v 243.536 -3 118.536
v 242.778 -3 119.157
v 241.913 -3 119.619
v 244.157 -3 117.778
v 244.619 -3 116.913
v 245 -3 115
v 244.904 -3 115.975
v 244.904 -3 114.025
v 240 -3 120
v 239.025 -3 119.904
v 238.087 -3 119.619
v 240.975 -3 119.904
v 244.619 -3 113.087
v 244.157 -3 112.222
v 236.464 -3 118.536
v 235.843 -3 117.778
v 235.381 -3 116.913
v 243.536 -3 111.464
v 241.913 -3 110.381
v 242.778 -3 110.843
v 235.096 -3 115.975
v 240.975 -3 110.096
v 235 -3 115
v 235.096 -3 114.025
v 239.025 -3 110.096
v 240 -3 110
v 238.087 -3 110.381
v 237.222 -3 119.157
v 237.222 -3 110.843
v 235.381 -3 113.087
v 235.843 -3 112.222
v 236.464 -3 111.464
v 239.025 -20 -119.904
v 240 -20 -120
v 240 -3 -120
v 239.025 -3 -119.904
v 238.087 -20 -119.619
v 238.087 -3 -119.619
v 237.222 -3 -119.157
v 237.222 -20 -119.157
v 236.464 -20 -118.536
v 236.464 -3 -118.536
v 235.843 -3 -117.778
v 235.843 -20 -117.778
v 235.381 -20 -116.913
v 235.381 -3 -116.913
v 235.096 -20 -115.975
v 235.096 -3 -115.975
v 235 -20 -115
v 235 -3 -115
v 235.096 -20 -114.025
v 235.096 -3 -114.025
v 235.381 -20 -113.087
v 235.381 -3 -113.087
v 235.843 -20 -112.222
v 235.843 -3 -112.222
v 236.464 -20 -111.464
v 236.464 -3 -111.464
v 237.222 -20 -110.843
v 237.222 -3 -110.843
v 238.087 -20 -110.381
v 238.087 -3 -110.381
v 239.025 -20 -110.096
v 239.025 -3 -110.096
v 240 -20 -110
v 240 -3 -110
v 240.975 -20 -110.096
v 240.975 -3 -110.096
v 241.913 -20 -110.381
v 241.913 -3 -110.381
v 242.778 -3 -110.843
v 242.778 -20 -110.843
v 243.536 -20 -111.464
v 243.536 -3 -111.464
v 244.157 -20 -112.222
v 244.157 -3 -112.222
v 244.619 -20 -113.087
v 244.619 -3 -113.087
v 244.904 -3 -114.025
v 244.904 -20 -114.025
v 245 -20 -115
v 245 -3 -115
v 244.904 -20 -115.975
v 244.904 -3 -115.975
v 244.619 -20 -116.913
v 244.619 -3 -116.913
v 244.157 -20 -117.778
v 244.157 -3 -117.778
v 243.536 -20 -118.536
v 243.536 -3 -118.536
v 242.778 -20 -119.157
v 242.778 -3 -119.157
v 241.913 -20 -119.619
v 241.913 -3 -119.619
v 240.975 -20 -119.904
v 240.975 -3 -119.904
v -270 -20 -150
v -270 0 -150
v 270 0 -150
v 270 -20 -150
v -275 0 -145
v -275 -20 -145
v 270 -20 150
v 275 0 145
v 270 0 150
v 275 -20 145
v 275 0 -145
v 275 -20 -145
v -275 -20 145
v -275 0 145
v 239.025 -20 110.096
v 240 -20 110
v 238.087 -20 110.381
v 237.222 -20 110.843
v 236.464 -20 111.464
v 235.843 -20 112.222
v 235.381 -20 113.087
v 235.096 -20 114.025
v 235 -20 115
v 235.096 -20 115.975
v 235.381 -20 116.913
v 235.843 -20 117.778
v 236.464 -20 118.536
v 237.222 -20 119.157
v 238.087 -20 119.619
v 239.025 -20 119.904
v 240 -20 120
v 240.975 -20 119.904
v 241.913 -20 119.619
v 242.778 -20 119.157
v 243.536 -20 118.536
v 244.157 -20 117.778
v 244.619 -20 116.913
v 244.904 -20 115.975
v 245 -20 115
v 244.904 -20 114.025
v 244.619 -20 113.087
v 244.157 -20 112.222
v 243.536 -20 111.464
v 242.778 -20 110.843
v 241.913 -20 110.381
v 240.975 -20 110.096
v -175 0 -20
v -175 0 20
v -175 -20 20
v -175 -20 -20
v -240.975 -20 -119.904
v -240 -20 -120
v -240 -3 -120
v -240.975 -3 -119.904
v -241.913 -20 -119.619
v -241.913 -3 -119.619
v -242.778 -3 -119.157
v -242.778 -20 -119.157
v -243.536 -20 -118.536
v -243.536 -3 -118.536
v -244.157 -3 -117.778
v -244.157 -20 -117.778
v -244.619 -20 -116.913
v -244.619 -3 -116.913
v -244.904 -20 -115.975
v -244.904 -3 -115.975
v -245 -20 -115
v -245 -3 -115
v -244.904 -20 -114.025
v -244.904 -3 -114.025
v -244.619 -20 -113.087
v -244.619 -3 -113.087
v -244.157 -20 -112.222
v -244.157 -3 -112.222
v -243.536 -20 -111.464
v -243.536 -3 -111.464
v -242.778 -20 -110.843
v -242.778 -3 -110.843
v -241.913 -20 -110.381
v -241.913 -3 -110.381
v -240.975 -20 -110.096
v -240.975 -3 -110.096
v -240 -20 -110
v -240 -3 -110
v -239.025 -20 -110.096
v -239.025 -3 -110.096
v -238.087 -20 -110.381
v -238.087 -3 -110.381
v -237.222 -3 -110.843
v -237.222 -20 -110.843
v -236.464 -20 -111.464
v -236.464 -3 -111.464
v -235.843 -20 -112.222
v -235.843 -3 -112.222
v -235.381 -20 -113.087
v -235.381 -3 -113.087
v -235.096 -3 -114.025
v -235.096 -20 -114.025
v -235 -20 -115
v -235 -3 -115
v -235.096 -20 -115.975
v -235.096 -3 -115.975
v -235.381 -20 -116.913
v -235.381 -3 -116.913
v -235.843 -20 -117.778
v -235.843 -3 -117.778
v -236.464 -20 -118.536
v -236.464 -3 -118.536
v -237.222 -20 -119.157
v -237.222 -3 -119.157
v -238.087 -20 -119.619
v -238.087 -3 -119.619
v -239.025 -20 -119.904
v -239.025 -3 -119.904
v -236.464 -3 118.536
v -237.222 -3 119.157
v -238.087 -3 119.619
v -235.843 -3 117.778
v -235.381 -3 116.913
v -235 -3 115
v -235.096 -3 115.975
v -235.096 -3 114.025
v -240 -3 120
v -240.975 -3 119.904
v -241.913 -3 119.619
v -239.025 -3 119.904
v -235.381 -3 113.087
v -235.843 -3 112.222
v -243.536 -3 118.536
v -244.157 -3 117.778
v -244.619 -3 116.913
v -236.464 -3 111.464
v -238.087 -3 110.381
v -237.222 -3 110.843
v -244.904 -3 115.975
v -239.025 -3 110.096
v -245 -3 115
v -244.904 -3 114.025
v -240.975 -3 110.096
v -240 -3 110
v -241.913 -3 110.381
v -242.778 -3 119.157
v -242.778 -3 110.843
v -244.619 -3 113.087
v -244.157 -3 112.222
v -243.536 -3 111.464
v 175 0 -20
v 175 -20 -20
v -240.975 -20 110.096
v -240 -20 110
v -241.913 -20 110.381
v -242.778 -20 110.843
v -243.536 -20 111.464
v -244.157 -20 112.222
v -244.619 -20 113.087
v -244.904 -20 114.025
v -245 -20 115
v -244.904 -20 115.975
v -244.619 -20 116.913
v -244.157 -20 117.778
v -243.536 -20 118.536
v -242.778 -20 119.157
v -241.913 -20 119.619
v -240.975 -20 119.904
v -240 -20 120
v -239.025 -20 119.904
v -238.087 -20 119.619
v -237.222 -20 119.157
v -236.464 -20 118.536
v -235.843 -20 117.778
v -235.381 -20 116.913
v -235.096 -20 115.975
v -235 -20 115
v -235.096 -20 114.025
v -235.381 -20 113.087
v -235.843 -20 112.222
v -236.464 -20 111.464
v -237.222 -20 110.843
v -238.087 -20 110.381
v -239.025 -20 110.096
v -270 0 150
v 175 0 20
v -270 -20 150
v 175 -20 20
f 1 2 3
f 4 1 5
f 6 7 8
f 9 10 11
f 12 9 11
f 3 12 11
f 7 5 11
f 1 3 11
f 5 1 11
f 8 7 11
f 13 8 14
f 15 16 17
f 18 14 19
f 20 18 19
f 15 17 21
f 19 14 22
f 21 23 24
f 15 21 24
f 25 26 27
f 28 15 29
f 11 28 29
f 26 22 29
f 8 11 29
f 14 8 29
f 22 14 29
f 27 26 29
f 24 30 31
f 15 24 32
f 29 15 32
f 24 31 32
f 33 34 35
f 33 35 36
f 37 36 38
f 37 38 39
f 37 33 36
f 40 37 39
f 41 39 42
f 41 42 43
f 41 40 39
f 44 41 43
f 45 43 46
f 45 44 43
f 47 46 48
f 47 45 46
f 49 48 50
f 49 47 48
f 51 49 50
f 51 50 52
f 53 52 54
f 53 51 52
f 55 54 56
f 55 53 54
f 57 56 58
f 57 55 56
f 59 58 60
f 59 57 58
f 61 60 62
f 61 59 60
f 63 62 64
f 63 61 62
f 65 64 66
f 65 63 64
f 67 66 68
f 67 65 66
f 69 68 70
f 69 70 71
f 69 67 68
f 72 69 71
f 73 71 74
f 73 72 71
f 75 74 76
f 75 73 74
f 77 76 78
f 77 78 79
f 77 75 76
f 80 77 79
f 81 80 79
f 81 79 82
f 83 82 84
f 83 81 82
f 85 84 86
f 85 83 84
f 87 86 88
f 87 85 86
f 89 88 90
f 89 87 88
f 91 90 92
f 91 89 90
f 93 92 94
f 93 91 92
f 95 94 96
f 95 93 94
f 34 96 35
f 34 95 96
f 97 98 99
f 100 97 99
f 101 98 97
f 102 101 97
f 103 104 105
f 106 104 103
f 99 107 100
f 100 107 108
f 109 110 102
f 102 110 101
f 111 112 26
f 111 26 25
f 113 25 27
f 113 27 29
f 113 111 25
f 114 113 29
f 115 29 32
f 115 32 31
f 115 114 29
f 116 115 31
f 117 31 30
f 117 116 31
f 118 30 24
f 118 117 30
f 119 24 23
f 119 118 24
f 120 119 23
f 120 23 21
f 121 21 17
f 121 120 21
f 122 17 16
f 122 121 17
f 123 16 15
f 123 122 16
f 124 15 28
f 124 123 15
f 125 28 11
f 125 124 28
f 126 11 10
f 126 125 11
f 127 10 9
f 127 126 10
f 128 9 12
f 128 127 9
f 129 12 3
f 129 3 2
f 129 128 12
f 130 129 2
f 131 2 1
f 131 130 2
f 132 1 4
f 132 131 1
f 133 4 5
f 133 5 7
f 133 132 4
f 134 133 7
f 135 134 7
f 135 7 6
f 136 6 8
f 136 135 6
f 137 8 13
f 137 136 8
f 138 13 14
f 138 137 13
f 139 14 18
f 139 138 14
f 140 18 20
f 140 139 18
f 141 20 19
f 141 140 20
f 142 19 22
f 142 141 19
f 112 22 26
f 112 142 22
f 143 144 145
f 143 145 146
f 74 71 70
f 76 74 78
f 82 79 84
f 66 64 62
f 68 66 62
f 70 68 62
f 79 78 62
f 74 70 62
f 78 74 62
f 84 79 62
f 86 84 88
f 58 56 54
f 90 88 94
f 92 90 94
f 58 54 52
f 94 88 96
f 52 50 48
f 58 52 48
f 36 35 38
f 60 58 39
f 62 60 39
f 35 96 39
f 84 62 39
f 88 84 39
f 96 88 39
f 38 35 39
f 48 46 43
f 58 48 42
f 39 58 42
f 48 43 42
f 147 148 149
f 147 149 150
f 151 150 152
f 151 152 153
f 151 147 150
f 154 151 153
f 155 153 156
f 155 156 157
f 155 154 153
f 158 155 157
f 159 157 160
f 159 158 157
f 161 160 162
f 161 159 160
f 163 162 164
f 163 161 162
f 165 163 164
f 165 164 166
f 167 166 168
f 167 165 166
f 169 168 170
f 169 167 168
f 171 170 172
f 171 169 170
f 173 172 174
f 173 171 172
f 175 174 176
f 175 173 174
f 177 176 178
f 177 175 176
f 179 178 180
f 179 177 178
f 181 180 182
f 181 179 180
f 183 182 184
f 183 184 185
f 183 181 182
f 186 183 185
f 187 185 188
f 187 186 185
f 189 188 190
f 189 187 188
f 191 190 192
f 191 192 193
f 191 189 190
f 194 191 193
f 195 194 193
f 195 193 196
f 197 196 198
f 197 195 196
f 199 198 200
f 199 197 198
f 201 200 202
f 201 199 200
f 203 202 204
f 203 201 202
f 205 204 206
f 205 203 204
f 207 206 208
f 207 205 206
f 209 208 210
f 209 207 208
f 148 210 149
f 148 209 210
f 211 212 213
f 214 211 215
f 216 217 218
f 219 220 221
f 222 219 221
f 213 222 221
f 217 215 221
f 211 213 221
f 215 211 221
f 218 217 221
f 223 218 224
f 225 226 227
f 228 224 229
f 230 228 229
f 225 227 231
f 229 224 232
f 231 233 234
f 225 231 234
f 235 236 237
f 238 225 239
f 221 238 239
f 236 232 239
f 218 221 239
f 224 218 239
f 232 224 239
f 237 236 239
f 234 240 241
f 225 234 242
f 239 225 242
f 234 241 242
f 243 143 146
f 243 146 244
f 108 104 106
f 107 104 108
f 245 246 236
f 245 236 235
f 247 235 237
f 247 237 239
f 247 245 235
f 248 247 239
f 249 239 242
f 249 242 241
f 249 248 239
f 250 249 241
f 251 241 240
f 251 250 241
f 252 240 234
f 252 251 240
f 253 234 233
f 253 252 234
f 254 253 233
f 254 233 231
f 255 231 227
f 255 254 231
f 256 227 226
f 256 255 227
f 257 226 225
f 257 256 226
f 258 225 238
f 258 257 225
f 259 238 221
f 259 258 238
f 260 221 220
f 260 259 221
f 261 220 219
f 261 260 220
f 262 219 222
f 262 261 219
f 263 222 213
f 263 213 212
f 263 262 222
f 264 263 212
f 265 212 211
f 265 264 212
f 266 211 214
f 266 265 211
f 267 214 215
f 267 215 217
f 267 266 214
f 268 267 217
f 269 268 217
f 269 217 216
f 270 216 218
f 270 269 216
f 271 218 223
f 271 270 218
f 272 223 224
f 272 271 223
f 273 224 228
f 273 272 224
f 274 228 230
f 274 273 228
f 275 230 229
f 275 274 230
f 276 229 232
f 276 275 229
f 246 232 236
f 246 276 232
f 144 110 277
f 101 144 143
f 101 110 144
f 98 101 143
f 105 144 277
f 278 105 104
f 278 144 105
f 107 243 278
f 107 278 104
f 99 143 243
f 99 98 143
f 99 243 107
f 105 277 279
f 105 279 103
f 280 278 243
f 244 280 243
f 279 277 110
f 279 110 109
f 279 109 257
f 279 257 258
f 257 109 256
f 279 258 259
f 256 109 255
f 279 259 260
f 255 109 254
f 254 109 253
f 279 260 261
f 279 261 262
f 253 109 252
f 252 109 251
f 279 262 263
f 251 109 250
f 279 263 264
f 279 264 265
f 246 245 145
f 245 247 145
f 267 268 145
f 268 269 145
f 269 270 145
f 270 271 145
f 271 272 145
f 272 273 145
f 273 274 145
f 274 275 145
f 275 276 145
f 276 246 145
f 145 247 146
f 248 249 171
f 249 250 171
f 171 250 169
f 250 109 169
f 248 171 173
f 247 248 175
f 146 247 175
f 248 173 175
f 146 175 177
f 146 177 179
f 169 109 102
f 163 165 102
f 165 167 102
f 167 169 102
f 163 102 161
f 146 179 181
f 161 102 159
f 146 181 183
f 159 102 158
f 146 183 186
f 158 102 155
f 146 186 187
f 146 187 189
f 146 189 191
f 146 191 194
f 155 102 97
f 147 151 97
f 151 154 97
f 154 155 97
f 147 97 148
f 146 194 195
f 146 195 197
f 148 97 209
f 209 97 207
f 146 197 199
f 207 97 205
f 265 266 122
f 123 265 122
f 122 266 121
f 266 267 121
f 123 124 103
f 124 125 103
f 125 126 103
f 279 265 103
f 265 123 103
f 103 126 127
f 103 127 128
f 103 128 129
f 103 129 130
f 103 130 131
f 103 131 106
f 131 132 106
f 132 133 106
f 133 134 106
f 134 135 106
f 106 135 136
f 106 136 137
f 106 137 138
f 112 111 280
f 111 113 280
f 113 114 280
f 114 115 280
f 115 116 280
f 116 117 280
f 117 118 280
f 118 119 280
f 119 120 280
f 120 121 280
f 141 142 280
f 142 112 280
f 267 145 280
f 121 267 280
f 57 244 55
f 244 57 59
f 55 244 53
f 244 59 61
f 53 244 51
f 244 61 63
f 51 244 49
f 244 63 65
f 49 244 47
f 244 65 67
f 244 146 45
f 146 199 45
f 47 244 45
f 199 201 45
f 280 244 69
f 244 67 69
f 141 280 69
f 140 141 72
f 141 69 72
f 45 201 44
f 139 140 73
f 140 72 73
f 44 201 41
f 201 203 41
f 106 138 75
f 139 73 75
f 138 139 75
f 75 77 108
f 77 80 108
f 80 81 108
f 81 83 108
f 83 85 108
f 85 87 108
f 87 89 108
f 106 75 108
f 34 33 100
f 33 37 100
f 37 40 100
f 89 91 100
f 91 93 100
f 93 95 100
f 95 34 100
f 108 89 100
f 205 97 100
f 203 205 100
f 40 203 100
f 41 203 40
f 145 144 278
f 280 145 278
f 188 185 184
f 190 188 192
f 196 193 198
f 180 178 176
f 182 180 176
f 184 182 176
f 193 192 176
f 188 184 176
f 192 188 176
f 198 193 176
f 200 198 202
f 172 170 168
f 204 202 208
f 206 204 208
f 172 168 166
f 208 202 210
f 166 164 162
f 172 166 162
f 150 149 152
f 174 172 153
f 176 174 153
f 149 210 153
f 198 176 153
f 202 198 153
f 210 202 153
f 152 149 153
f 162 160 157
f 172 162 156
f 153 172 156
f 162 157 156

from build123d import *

# Parameters (mm, degrees)
SKETCH_1_W          = 550
SKETCH_1_H          = 300
SKETCH_1_W_2        = 350
SKETCH_1_H_2        = 40
EXTRUDE_1_DEPTH     = 20
CHAMFER_1_SIZE      = 5
SKETCH_2_R          = 5
CUT_EXTRUDE_1_DEPTH = 17


with BuildPart() as part:
    # Эскиз1 → Бобышка-Вытянуть1 (new body)
    with BuildSketch(Plane(origin=(0, 0, 0), x_dir=(1, 0, 0), z_dir=(0, 1, 0))):
        Rectangle(SKETCH_1_W, SKETCH_1_H)
        Rectangle(SKETCH_1_W_2, SKETCH_1_H_2, mode=Mode.SUBTRACT)
    extrude(amount=-EXTRUDE_1_DEPTH)

    # Фаска1
    chamfer_1_edges = [part.edges().sort_by_distance(p)[0] for p in [
        (275, -10, 150),
        (-275, -10, 150),
        (-275, -10, -150),
        (275, -10, -150),
    ]]
    chamfer(chamfer_1_edges, length=CHAMFER_1_SIZE)

    # Эскиз2 → Вырез-Вытянуть1 (cut)
    with BuildSketch(Plane(origin=(0, -20, 0), x_dir=(-1, 0, 0), z_dir=(0, 1, 0))):
        with Locations(Location((240, 115, 0), (0, 0, 270))):
            Circle(SKETCH_2_R)
        with Locations(Location((-240, 115, 0), (0, 0, 270))):
            Circle(SKETCH_2_R)
        with Locations(Location((-240, -115, 0), (0, 0, 270))):
            Circle(SKETCH_2_R)
        with Locations(Location((240, -115, 0), (0, 0, 270))):
            Circle(SKETCH_2_R)
    extrude(amount=CUT_EXTRUDE_1_DEPTH, mode=Mode.SUBTRACT)


solid = part.part
